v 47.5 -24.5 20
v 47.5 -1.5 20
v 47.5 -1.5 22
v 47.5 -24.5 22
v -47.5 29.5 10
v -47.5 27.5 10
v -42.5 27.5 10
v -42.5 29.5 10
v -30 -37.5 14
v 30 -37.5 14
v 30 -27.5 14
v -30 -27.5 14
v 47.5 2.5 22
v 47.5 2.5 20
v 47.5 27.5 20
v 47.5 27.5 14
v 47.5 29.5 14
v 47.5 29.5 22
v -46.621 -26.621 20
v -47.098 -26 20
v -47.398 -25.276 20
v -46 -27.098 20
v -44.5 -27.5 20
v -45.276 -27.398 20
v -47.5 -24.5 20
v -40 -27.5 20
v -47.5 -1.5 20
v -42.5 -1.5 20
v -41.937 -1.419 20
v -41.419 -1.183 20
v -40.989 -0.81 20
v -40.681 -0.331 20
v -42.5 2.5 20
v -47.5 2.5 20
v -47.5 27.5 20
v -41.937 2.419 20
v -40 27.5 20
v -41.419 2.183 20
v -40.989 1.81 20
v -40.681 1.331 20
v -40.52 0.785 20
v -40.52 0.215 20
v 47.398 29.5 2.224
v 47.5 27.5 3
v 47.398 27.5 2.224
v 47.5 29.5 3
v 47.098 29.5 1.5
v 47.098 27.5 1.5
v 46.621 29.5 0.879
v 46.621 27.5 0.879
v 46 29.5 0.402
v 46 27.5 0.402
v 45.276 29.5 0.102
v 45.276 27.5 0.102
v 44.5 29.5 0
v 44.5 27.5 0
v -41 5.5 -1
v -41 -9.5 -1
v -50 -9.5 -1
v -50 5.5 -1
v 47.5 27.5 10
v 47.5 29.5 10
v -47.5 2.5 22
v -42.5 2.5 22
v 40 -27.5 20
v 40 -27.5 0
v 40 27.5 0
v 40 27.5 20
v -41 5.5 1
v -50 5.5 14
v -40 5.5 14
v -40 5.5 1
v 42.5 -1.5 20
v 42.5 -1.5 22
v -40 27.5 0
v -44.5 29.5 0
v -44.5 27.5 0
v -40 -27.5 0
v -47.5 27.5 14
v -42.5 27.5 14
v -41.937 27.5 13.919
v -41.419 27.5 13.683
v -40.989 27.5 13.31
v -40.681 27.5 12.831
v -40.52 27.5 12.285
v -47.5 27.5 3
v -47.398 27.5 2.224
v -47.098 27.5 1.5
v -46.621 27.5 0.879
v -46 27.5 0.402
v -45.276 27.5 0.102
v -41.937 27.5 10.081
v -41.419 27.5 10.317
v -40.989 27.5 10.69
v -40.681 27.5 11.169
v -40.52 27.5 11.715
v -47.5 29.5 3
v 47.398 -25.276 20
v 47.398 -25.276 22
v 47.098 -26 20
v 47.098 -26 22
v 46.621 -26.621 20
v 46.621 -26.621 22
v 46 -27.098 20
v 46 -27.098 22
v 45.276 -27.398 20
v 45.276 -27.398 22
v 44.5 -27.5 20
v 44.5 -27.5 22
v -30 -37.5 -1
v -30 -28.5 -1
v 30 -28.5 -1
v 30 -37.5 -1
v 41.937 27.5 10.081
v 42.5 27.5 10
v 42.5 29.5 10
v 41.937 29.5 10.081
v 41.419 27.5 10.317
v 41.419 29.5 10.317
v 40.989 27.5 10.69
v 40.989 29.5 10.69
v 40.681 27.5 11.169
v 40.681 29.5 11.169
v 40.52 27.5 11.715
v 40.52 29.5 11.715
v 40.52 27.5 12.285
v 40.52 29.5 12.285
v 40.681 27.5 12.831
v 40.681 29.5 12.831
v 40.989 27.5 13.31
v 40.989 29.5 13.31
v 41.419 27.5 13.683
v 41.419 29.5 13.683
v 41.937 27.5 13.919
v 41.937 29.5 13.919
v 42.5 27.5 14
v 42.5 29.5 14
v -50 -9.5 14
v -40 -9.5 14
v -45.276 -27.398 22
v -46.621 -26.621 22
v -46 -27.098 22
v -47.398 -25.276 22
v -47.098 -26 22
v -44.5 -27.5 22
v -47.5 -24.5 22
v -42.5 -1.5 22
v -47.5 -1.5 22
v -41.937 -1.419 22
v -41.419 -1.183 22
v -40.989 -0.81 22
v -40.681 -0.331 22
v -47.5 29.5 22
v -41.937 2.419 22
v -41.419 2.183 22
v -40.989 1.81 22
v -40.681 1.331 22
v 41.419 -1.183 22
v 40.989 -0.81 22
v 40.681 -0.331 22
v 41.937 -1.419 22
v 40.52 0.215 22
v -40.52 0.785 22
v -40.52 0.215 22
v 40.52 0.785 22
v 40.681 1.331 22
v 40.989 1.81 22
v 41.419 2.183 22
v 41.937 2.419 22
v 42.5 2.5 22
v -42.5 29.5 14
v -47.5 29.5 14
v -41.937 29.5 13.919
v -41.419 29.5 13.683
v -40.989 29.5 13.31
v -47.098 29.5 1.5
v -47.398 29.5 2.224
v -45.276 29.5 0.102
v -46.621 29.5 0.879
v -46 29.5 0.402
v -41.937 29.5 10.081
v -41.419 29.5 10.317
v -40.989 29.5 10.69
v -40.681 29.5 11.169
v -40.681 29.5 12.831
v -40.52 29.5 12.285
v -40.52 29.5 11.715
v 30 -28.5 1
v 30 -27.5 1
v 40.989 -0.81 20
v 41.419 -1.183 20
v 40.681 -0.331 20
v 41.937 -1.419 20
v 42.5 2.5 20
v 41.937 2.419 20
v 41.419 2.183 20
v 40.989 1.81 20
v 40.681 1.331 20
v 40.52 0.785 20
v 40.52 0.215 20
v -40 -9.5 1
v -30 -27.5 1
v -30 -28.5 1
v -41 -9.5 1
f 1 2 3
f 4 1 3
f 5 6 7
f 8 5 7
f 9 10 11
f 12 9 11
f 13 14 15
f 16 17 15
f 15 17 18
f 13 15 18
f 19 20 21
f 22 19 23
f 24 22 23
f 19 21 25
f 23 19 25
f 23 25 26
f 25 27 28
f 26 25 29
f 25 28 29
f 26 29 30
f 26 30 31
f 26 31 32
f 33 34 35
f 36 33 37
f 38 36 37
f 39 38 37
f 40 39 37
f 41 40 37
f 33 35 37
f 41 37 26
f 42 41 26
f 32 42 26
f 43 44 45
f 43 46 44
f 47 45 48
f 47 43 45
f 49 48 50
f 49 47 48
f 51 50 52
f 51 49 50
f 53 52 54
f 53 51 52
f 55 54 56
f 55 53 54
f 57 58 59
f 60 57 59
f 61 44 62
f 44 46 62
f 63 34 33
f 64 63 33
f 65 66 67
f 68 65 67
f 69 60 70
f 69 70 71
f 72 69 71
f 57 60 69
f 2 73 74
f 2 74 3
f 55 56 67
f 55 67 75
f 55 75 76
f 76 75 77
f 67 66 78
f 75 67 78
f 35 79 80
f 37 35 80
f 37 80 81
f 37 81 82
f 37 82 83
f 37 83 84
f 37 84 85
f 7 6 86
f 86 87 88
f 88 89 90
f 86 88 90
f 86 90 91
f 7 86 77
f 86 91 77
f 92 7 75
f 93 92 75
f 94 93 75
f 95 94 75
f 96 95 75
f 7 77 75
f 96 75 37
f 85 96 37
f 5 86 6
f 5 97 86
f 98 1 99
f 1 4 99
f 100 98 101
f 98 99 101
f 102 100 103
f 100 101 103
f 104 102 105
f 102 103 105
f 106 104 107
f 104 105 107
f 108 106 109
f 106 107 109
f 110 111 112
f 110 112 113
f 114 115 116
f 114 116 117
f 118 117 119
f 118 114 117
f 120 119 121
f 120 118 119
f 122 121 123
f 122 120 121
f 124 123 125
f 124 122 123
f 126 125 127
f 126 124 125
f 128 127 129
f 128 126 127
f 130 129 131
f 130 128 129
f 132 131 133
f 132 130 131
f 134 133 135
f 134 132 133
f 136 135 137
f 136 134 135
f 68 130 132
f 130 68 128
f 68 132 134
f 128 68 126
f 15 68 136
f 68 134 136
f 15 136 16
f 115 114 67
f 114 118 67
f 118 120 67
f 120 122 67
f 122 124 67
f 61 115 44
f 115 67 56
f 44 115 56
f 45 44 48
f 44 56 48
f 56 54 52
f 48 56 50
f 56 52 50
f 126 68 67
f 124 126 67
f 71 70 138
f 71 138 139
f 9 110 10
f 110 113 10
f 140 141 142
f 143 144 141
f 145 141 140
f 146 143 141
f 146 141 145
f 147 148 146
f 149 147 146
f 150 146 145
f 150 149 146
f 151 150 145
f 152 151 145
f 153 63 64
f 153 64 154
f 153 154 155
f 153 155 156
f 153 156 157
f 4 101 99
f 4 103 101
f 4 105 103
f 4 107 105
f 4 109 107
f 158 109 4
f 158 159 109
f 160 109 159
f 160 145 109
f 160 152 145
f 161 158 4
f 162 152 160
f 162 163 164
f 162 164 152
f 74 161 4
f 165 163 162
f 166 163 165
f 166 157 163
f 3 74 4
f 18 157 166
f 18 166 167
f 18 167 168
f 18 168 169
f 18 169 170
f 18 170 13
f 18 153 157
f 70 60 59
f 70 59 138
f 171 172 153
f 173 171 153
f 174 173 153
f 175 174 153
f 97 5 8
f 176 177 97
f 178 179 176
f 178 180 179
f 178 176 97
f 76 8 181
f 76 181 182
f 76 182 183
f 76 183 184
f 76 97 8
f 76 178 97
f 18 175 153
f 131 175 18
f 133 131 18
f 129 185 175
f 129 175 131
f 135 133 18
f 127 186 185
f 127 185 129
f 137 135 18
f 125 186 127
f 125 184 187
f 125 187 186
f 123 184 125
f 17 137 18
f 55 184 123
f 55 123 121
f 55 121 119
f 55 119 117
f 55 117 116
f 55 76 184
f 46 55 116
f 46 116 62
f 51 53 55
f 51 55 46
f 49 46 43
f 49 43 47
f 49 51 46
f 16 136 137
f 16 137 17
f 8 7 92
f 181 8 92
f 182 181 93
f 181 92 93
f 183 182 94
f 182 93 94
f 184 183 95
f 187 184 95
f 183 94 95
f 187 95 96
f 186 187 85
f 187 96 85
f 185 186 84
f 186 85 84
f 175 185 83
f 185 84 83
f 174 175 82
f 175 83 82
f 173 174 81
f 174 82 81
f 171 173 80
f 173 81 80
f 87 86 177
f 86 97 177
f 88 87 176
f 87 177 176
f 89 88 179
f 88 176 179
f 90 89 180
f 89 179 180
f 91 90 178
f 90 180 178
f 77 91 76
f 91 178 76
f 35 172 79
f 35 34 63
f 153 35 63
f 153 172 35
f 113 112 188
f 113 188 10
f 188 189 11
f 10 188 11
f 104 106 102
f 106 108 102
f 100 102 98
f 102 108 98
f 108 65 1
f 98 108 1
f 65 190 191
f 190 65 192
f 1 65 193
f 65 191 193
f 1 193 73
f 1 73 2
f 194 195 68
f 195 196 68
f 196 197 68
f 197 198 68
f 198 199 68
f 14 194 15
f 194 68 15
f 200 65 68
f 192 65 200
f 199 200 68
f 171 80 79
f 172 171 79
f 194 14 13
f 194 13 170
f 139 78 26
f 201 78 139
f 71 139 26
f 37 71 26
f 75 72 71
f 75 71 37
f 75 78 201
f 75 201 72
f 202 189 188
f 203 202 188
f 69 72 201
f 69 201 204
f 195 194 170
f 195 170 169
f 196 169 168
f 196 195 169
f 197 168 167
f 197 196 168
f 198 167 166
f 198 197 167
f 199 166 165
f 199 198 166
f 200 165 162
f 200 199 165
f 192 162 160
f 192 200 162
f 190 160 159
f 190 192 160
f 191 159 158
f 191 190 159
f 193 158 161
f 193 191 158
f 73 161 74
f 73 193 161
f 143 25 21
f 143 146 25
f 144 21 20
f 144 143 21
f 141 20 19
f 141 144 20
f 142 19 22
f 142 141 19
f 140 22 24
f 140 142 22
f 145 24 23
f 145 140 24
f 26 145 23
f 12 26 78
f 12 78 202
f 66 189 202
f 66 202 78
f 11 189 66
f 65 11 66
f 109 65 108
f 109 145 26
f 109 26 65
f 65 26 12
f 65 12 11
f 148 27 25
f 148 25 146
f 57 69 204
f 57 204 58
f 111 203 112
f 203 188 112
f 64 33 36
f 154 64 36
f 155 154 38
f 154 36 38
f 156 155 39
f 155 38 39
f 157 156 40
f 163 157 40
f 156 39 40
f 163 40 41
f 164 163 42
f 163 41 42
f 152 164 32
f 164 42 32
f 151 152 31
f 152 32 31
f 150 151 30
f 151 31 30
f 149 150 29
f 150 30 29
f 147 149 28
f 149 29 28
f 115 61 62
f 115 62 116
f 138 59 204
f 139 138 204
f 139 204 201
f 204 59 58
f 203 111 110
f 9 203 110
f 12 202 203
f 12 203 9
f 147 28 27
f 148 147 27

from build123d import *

# Parameters (mm, degrees)
SKETCH_1_W          = 80
SKETCH_1_H          = 55
EXTRUDE_1_DEPTH     = 20
EXTRUDE_2_DEPTH     = 2
SKETCH_3_W          = 95
SKETCH_3_H          = 2
EXTRUDE_3_DEPTH     = 55
EXTRUDE_4_DEPTH     = 30
CUT_EXTRUDE_1_DEPTH = 84.458073306
CUT_EXTRUDE_2_DEPTH = 65.058566952
FILLET_1_R          = 3
EXTRUDE_5_DEPTH     = 15


with BuildPart() as part:
    # 草图1 → 凸台-拉伸1 (new body)
    with BuildSketch(Plane.XY):
        Rectangle(SKETCH_1_W, SKETCH_1_H)
    extrude(amount=EXTRUDE_1_DEPTH)



with BuildPart() as body_2:
    # 草图2 → 凸台-拉伸2 (new body)
    with BuildSketch(Plane(origin=(0, 27.5, 0), x_dir=(1, 0, 0), z_dir=(0, 1, 0))):
        Polygon((-47.5, 0), (-47.5, -22), (47.5, -22), (47.5, 0), (40, 0), (-40, 0), align=None)
    extrude(amount=EXTRUDE_2_DEPTH)


with BuildPart() as part_1:
    add(part.part)

    add(body_2.part)  # 凸台-拉伸3 merges body 2
    # 草图3 → 凸台-拉伸3 (add)
    with BuildSketch(Plane.XZ.offset(-27.5)):
        with Locations((0, 21)):
            Rectangle(SKETCH_3_W, SKETCH_3_H)
    extrude(amount=EXTRUDE_3_DEPTH)

    # 草图4 → 凸台-拉伸4 (add, symmetric)
    with BuildSketch(Plane(origin=(0, 0, 0), x_dir=(0, 0, -1), z_dir=(1, 0, 0))):
        Polygon((-1, -27.5), (-1, -28.5), (1, -28.5), (1, -37.5), (-14, -37.5), (-14, -27.5), align=None)
    extrude(amount=EXTRUDE_4_DEPTH, both=True)

    # 草图5 → 切除-拉伸1 (cut, through all)
    with BuildSketch(Plane.XZ.offset(-27.5)):
        with BuildLine():
            Line((52.5, 10), (42.5, 10))
            ThreePointArc((42.5, 10), (40.5, 12), (42.5, 14))
            Line((42.5, 14), (52.5, 14))
            ThreePointArc((52.5, 14), (54.5, 12), (52.5, 10))
        make_face()
    cut_extrude_1 = extrude(amount=-CUT_EXTRUDE_1_DEPTH, mode=Mode.SUBTRACT)

    # 草图6 → 切除-拉伸2 (cut, through all)
    with BuildSketch(Plane(origin=(0, 0, 20), x_dir=(-1, 0, 0), z_dir=(0, 0, -1))):
        with BuildLine():
            Line((-52.5, 2.5), (-42.5, 2.5))
            ThreePointArc((-42.5, 2.5), (-40.5, 0.5), (-42.5, -1.5))
            Line((-42.5, -1.5), (-52.5, -1.5))
            ThreePointArc((-52.5, -1.5), (-54.5, 0.5), (-52.5, 2.5))
        make_face()
    cut_extrude_2 = extrude(amount=-CUT_EXTRUDE_2_DEPTH, mode=Mode.SUBTRACT)

    # 镜向1: 切除-拉伸1, 切除-拉伸2 across plane
    add(cut_extrude_1.mirror(Plane(origin=(0, 0, 0), x_dir=(0, 0, 1), z_dir=(1, 0, 0))), mode=Mode.SUBTRACT)
    add(cut_extrude_2.mirror(Plane(origin=(0, 0, 0), x_dir=(0, 0, 1), z_dir=(1, 0, 0))), mode=Mode.SUBTRACT)

    # 圆角1
    fillet_1_edges = [part_1.edges().sort_by_distance(p)[0] for p in [
        (47.5, -27.5, 21),
        (-47.5, -27.5, 21),
        (47.5, 28.5, 0),
        (-47.5, 28.5, 0),
    ]]
    fillet(fillet_1_edges, radius=FILLET_1_R)

    # 草图7 → 凸台-拉伸5 (add)
    with BuildSketch(Plane(origin=(0, 5.5, 0), x_dir=(-1, 0, 0), z_dir=(0, -1, 0))):
        Polygon((40, -1), (41, -1), (41, 1), (50, 1), (50, -14), (40, -14), align=None)
    extrude(amount=EXTRUDE_5_DEPTH)


solid = part_1.part
